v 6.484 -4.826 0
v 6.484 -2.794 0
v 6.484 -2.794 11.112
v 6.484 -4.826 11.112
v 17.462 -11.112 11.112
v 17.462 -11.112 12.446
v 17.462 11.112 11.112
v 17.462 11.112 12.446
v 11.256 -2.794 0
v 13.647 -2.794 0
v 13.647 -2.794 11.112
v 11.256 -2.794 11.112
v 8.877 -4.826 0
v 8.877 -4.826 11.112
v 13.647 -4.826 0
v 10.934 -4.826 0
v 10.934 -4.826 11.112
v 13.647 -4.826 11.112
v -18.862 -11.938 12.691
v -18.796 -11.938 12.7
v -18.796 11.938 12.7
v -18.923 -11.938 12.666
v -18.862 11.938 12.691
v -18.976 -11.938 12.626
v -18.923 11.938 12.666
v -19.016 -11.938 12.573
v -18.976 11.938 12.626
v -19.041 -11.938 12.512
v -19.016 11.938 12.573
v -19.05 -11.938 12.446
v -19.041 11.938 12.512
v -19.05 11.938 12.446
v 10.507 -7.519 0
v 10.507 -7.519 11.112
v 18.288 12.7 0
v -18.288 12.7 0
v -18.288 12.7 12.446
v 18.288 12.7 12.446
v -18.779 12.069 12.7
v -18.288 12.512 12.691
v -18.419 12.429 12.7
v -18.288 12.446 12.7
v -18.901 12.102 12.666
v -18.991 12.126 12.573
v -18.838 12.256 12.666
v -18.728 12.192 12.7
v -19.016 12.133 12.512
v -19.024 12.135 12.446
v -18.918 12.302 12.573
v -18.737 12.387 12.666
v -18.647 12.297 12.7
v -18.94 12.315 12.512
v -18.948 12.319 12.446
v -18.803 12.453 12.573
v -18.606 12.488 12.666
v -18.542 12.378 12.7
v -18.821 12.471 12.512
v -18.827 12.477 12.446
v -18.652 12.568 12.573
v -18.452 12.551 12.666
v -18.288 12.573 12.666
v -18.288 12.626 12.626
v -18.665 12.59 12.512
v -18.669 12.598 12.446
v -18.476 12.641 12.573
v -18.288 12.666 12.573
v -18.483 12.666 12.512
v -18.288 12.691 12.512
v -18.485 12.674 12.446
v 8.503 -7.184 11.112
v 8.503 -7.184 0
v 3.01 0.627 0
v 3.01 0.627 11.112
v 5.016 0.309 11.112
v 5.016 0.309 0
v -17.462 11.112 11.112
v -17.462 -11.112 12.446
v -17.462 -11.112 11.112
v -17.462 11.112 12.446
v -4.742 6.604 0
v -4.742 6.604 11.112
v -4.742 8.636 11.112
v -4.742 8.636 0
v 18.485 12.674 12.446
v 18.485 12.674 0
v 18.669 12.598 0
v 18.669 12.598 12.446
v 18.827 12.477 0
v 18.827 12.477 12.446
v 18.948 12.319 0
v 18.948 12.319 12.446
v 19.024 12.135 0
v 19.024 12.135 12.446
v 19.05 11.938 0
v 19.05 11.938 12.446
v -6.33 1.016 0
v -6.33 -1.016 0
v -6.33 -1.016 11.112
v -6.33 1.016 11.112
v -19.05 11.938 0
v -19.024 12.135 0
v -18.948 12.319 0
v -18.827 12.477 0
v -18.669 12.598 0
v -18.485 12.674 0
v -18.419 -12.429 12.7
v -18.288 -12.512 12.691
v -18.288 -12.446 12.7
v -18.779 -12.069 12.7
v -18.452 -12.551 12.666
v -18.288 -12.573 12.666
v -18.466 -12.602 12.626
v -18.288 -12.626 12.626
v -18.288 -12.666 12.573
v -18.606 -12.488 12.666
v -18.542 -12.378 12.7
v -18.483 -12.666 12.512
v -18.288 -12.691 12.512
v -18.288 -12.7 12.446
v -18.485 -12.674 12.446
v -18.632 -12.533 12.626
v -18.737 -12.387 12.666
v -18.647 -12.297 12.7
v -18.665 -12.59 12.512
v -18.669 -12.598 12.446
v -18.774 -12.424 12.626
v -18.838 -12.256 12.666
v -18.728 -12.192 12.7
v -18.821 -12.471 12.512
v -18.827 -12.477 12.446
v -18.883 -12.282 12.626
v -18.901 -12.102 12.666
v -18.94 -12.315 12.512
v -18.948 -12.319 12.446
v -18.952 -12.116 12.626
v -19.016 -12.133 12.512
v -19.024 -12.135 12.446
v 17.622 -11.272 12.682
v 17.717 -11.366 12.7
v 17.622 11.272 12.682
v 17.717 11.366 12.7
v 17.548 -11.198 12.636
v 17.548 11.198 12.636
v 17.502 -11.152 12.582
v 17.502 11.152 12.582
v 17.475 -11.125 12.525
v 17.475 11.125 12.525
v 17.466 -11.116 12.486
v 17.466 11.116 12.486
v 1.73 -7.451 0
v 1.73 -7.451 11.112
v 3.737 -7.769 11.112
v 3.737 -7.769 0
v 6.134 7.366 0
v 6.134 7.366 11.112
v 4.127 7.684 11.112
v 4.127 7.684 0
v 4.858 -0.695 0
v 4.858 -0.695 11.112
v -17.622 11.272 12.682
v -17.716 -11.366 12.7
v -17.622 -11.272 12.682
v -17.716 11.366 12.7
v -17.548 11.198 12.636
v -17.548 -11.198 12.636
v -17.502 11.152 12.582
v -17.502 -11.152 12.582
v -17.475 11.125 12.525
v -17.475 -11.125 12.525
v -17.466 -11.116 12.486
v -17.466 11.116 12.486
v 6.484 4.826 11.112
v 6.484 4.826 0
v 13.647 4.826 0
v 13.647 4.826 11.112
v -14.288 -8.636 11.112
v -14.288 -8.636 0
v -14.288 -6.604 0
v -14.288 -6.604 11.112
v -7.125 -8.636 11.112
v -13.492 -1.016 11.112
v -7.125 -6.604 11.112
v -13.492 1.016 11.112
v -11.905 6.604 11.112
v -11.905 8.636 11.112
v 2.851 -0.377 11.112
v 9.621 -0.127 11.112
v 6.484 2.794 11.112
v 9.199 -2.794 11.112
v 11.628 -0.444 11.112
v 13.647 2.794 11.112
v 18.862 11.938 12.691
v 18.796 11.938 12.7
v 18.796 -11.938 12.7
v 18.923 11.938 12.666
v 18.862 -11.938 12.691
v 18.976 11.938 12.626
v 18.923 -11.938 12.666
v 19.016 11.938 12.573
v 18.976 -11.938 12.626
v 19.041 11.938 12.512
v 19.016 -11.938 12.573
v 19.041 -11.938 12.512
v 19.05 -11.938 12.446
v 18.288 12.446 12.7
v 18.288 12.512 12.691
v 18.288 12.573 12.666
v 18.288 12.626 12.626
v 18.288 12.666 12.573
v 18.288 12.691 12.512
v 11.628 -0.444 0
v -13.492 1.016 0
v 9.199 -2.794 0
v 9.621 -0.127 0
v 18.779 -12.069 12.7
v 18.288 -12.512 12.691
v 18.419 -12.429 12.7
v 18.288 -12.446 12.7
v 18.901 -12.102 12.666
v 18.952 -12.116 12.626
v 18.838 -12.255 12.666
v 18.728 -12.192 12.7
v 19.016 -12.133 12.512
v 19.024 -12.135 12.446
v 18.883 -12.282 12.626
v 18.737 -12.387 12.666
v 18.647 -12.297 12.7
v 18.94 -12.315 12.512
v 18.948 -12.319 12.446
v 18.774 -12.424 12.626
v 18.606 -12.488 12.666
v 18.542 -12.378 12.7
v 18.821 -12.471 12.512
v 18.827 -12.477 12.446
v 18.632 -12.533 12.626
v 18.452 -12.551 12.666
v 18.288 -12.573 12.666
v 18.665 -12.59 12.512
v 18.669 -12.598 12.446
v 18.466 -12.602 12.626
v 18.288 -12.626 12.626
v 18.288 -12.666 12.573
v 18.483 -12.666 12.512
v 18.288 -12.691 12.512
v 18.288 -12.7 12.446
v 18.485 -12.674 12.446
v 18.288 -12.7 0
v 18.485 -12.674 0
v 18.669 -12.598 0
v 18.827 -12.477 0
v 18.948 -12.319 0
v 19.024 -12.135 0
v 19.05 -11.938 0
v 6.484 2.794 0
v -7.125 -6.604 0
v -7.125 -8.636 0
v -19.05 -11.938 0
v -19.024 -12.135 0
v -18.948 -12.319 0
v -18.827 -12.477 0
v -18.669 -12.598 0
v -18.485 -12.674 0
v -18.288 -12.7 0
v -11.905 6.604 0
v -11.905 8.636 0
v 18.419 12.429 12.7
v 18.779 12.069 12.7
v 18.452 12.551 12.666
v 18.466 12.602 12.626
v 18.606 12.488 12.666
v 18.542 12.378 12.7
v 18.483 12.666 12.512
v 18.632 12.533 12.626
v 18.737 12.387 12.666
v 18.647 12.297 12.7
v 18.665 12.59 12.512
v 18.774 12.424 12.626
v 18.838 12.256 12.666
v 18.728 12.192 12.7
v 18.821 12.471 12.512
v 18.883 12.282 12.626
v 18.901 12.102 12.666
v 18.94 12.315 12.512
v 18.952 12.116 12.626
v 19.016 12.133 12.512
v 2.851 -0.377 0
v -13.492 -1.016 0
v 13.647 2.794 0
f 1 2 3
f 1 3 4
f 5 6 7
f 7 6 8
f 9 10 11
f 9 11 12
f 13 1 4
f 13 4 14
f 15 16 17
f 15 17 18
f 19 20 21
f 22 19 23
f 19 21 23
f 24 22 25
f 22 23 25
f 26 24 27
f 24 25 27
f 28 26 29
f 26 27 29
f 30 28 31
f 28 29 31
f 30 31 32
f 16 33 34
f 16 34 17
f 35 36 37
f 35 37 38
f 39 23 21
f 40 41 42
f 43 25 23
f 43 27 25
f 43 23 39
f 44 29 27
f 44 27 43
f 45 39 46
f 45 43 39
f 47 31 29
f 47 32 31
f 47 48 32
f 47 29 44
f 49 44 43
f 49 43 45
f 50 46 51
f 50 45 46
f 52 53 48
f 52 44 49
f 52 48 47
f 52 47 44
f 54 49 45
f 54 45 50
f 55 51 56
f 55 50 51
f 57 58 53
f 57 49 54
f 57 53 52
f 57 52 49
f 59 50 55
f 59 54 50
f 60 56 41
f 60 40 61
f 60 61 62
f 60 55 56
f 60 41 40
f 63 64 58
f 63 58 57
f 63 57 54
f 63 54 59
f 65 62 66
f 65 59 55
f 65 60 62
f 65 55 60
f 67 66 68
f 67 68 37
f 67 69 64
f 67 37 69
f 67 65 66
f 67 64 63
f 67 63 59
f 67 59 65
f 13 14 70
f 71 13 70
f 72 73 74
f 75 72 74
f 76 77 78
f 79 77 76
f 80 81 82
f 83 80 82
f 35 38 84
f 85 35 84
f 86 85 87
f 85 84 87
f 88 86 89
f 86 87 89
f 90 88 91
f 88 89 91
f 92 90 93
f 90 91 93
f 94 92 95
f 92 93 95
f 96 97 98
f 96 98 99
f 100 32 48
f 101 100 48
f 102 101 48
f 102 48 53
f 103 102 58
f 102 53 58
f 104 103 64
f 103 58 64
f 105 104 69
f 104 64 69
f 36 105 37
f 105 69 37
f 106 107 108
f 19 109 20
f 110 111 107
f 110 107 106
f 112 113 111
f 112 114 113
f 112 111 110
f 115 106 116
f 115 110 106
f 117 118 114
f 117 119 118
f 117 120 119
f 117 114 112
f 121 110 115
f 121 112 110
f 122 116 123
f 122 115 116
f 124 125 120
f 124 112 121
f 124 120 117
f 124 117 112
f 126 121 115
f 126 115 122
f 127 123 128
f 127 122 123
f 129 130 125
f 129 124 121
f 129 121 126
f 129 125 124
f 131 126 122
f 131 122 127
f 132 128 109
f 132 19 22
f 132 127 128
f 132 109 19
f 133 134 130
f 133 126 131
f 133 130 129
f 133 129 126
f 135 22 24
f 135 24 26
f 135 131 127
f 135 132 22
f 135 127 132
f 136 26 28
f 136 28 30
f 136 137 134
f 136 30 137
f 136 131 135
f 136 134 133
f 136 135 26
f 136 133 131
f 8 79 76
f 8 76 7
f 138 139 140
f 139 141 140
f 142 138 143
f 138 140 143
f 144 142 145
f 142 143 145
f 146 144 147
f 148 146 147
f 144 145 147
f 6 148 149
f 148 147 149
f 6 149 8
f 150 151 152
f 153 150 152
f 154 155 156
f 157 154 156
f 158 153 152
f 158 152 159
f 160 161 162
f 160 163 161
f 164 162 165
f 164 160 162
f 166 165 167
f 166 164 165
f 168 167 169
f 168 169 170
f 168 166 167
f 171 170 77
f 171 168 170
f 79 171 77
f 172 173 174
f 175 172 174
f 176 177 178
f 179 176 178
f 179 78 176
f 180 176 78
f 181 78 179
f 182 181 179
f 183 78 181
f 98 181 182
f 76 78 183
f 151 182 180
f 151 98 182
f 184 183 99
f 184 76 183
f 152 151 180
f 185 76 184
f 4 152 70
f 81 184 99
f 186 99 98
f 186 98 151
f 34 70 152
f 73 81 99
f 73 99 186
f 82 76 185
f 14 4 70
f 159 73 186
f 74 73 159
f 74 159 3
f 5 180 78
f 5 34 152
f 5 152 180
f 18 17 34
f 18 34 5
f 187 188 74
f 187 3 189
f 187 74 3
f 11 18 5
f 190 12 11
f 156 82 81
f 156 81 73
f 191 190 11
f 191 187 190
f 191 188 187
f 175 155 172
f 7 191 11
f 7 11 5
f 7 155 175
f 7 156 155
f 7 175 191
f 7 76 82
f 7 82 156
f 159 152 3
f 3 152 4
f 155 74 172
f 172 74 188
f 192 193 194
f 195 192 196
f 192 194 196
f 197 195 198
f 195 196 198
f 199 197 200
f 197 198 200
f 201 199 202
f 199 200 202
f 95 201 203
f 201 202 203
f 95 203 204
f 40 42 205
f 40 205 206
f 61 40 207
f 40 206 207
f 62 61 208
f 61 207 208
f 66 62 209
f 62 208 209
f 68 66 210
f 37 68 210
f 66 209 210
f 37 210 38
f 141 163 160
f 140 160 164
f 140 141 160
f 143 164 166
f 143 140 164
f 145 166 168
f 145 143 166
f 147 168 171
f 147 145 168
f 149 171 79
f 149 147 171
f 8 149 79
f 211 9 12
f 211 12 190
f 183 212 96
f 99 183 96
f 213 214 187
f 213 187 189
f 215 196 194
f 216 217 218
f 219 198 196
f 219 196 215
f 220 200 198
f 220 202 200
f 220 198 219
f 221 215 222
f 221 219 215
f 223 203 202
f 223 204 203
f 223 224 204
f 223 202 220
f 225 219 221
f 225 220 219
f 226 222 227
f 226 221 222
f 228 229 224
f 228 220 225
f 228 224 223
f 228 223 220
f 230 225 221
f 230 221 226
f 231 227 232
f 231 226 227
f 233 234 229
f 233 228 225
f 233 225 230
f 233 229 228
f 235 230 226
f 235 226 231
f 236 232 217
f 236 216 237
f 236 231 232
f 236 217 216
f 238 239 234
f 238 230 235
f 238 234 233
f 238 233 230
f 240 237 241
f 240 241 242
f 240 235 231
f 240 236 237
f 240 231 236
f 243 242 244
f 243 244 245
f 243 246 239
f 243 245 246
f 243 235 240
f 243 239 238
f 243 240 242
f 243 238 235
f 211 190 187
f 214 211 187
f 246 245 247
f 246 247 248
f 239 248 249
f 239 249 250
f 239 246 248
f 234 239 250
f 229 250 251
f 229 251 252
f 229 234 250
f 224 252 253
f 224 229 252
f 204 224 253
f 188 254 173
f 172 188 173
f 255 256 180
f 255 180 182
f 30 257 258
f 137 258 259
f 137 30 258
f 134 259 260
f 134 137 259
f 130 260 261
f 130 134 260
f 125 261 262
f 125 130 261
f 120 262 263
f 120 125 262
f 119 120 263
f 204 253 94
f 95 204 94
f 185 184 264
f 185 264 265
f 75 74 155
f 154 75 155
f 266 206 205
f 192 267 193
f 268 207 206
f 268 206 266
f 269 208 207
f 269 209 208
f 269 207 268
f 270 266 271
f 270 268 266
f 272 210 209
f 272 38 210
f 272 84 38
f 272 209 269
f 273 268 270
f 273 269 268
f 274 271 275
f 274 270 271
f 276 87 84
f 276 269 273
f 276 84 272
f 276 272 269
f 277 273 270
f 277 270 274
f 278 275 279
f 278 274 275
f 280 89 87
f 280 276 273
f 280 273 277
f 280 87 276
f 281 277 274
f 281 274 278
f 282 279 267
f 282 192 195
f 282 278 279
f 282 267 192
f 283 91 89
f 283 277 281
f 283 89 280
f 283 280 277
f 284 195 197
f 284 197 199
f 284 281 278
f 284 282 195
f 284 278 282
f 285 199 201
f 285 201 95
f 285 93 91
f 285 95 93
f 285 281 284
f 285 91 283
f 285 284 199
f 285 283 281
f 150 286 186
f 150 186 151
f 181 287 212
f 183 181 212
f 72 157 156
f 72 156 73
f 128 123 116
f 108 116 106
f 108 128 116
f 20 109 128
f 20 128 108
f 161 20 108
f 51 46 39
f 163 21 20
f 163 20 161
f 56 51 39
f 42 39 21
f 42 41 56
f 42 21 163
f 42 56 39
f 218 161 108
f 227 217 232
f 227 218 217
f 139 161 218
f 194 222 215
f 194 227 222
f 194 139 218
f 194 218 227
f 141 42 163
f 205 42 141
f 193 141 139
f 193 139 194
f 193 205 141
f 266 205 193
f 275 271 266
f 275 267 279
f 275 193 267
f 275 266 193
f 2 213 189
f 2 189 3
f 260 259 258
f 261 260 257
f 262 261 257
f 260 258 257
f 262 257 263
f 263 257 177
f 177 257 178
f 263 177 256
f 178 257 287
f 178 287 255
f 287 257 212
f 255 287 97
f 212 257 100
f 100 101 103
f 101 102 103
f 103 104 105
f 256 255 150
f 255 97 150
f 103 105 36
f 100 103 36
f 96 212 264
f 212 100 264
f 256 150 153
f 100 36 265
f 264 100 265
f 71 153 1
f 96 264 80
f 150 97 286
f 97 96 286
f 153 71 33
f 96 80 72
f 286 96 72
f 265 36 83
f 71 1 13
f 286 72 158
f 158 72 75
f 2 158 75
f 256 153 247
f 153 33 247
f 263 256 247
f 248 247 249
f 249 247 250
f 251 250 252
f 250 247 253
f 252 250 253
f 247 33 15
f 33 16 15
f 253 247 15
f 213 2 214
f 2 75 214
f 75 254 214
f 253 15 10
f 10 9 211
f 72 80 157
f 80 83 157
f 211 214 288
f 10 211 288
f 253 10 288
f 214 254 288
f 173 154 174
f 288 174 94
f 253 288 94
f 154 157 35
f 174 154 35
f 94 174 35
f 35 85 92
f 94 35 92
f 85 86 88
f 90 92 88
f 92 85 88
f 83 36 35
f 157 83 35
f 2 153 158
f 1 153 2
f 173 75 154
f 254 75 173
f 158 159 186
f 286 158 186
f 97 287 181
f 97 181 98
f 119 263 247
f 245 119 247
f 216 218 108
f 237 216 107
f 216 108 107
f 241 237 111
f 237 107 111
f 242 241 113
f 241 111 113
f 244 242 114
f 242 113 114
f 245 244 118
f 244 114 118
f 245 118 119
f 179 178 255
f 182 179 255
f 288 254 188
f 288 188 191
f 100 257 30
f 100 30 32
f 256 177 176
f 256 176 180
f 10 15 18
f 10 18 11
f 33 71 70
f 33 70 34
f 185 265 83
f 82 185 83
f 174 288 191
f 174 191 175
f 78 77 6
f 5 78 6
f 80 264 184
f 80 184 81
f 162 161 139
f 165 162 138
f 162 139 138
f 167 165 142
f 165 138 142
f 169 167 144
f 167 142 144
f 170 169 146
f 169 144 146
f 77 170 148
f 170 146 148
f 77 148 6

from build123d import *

# Parameters (mm, degrees)
F0_W     = 38.1
F0_H     = 25.4
F1_DEPTH = 12.7
F2_W     = 34.925
F2_H     = 22.225
F3_DEPTH = 1.5875
F4_R     = 0.762
F5_R     = 0.254
F6_W     = 7.1628
F6_H     = 2.032
F7_DEPTH = 25.4


with BuildPart() as f1:
    # F0 (on Top) → F1 (new body)
    with BuildSketch(Plane.XY):
        Rectangle(F0_W, F0_H)
    extrude(amount=F1_DEPTH)

    # F2 (on face) → F3 (cut)
    with BuildSketch(Plane.XY.offset(12.7)):
        Rectangle(F2_W, F2_H)
    extrude(amount=-F3_DEPTH, mode=Mode.SUBTRACT)

    # F4
    f4_edges = [f1.edges().sort_by_distance(p)[0] for p in [
        (-19.05, -12.7, 6.35),
        (-19.05, 12.7, 6.35),
        (19.05, 12.7, 6.35),
        (19.05, -12.7, 6.35),
    ]]
    fillet(f4_edges, radius=F4_R)

    # F5
    f5_edges = [f1.edges().sort_by_distance(p)[0] for p in [
        (0, 12.7, 12.7),
        (18.826815, 12.476815, 12.7),
        (-18.826815, 12.476815, 12.7),
        (19.05, 0, 12.7),
        (-19.05, 0, 12.7),
        (18.826815, -12.476815, 12.7),
        (-18.826815, -12.476815, 12.7),
        (0, -12.7, 12.7),
        (0, 11.1125, 12.7),
        (-17.4625, 0, 12.7),
        (0, -11.1125, 12.7),
        (17.4625, 0, 12.7),
    ]]
    fillet(f5_edges, radius=F5_R)

    # F6 (on Top) → F7 (cut)
    with BuildSketch(Plane.XY):
        with Locations((-10.7061, -7.62)):
            Rectangle(F6_W, F6_H)
        with Locations((-9.91108, 0)):
            Rectangle(F6_W, F6_H)
        with Locations((-8.32358, 7.62)):
            Rectangle(F6_W, F6_H)
        with Locations((10.0658737301, 3.81)):
            Rectangle(F6_W, F6_H)
        Polygon((9.198520352, -2.794), (6.4844737301, -2.794), (6.4844737301, -4.826), (8.8766831692, -4.826), align=None)
        Polygon((9.620991022, -0.126625167), (9.198520352, -2.794), (11.2558494876, -2.794), (11.6279737301, -0.4445), align=None)
        Polygon((11.2558494876, -2.794), (9.198520352, -2.794), (8.8766831692, -4.826), (10.9340123049, -4.826), align=None)
        Polygon((13.6472737301, -2.794), (11.2558494876, -2.794), (10.9340123049, -4.826), (13.6472737301, -4.826), align=None)
        Polygon((10.9340123049, -4.826), (8.8766831692, -4.826), (8.5032636406, -7.1836781144), (10.5074649439, -7.519114046), align=None)
        Polygon((5.0164880452, 0.3089470527), (6.1342154266, 7.366), (4.1272327185, 7.683874833), (3.0095053371, 0.6268218856), align=None)
        Polygon((3.7370418425, -7.7691583474), (4.8575506287, -0.6945443014), (2.8505679206, -0.3766694684), (1.7300591344, -7.4512835144), align=None)
    extrude(amount=F7_DEPTH, mode=Mode.SUBTRACT)


solid = f1.part
